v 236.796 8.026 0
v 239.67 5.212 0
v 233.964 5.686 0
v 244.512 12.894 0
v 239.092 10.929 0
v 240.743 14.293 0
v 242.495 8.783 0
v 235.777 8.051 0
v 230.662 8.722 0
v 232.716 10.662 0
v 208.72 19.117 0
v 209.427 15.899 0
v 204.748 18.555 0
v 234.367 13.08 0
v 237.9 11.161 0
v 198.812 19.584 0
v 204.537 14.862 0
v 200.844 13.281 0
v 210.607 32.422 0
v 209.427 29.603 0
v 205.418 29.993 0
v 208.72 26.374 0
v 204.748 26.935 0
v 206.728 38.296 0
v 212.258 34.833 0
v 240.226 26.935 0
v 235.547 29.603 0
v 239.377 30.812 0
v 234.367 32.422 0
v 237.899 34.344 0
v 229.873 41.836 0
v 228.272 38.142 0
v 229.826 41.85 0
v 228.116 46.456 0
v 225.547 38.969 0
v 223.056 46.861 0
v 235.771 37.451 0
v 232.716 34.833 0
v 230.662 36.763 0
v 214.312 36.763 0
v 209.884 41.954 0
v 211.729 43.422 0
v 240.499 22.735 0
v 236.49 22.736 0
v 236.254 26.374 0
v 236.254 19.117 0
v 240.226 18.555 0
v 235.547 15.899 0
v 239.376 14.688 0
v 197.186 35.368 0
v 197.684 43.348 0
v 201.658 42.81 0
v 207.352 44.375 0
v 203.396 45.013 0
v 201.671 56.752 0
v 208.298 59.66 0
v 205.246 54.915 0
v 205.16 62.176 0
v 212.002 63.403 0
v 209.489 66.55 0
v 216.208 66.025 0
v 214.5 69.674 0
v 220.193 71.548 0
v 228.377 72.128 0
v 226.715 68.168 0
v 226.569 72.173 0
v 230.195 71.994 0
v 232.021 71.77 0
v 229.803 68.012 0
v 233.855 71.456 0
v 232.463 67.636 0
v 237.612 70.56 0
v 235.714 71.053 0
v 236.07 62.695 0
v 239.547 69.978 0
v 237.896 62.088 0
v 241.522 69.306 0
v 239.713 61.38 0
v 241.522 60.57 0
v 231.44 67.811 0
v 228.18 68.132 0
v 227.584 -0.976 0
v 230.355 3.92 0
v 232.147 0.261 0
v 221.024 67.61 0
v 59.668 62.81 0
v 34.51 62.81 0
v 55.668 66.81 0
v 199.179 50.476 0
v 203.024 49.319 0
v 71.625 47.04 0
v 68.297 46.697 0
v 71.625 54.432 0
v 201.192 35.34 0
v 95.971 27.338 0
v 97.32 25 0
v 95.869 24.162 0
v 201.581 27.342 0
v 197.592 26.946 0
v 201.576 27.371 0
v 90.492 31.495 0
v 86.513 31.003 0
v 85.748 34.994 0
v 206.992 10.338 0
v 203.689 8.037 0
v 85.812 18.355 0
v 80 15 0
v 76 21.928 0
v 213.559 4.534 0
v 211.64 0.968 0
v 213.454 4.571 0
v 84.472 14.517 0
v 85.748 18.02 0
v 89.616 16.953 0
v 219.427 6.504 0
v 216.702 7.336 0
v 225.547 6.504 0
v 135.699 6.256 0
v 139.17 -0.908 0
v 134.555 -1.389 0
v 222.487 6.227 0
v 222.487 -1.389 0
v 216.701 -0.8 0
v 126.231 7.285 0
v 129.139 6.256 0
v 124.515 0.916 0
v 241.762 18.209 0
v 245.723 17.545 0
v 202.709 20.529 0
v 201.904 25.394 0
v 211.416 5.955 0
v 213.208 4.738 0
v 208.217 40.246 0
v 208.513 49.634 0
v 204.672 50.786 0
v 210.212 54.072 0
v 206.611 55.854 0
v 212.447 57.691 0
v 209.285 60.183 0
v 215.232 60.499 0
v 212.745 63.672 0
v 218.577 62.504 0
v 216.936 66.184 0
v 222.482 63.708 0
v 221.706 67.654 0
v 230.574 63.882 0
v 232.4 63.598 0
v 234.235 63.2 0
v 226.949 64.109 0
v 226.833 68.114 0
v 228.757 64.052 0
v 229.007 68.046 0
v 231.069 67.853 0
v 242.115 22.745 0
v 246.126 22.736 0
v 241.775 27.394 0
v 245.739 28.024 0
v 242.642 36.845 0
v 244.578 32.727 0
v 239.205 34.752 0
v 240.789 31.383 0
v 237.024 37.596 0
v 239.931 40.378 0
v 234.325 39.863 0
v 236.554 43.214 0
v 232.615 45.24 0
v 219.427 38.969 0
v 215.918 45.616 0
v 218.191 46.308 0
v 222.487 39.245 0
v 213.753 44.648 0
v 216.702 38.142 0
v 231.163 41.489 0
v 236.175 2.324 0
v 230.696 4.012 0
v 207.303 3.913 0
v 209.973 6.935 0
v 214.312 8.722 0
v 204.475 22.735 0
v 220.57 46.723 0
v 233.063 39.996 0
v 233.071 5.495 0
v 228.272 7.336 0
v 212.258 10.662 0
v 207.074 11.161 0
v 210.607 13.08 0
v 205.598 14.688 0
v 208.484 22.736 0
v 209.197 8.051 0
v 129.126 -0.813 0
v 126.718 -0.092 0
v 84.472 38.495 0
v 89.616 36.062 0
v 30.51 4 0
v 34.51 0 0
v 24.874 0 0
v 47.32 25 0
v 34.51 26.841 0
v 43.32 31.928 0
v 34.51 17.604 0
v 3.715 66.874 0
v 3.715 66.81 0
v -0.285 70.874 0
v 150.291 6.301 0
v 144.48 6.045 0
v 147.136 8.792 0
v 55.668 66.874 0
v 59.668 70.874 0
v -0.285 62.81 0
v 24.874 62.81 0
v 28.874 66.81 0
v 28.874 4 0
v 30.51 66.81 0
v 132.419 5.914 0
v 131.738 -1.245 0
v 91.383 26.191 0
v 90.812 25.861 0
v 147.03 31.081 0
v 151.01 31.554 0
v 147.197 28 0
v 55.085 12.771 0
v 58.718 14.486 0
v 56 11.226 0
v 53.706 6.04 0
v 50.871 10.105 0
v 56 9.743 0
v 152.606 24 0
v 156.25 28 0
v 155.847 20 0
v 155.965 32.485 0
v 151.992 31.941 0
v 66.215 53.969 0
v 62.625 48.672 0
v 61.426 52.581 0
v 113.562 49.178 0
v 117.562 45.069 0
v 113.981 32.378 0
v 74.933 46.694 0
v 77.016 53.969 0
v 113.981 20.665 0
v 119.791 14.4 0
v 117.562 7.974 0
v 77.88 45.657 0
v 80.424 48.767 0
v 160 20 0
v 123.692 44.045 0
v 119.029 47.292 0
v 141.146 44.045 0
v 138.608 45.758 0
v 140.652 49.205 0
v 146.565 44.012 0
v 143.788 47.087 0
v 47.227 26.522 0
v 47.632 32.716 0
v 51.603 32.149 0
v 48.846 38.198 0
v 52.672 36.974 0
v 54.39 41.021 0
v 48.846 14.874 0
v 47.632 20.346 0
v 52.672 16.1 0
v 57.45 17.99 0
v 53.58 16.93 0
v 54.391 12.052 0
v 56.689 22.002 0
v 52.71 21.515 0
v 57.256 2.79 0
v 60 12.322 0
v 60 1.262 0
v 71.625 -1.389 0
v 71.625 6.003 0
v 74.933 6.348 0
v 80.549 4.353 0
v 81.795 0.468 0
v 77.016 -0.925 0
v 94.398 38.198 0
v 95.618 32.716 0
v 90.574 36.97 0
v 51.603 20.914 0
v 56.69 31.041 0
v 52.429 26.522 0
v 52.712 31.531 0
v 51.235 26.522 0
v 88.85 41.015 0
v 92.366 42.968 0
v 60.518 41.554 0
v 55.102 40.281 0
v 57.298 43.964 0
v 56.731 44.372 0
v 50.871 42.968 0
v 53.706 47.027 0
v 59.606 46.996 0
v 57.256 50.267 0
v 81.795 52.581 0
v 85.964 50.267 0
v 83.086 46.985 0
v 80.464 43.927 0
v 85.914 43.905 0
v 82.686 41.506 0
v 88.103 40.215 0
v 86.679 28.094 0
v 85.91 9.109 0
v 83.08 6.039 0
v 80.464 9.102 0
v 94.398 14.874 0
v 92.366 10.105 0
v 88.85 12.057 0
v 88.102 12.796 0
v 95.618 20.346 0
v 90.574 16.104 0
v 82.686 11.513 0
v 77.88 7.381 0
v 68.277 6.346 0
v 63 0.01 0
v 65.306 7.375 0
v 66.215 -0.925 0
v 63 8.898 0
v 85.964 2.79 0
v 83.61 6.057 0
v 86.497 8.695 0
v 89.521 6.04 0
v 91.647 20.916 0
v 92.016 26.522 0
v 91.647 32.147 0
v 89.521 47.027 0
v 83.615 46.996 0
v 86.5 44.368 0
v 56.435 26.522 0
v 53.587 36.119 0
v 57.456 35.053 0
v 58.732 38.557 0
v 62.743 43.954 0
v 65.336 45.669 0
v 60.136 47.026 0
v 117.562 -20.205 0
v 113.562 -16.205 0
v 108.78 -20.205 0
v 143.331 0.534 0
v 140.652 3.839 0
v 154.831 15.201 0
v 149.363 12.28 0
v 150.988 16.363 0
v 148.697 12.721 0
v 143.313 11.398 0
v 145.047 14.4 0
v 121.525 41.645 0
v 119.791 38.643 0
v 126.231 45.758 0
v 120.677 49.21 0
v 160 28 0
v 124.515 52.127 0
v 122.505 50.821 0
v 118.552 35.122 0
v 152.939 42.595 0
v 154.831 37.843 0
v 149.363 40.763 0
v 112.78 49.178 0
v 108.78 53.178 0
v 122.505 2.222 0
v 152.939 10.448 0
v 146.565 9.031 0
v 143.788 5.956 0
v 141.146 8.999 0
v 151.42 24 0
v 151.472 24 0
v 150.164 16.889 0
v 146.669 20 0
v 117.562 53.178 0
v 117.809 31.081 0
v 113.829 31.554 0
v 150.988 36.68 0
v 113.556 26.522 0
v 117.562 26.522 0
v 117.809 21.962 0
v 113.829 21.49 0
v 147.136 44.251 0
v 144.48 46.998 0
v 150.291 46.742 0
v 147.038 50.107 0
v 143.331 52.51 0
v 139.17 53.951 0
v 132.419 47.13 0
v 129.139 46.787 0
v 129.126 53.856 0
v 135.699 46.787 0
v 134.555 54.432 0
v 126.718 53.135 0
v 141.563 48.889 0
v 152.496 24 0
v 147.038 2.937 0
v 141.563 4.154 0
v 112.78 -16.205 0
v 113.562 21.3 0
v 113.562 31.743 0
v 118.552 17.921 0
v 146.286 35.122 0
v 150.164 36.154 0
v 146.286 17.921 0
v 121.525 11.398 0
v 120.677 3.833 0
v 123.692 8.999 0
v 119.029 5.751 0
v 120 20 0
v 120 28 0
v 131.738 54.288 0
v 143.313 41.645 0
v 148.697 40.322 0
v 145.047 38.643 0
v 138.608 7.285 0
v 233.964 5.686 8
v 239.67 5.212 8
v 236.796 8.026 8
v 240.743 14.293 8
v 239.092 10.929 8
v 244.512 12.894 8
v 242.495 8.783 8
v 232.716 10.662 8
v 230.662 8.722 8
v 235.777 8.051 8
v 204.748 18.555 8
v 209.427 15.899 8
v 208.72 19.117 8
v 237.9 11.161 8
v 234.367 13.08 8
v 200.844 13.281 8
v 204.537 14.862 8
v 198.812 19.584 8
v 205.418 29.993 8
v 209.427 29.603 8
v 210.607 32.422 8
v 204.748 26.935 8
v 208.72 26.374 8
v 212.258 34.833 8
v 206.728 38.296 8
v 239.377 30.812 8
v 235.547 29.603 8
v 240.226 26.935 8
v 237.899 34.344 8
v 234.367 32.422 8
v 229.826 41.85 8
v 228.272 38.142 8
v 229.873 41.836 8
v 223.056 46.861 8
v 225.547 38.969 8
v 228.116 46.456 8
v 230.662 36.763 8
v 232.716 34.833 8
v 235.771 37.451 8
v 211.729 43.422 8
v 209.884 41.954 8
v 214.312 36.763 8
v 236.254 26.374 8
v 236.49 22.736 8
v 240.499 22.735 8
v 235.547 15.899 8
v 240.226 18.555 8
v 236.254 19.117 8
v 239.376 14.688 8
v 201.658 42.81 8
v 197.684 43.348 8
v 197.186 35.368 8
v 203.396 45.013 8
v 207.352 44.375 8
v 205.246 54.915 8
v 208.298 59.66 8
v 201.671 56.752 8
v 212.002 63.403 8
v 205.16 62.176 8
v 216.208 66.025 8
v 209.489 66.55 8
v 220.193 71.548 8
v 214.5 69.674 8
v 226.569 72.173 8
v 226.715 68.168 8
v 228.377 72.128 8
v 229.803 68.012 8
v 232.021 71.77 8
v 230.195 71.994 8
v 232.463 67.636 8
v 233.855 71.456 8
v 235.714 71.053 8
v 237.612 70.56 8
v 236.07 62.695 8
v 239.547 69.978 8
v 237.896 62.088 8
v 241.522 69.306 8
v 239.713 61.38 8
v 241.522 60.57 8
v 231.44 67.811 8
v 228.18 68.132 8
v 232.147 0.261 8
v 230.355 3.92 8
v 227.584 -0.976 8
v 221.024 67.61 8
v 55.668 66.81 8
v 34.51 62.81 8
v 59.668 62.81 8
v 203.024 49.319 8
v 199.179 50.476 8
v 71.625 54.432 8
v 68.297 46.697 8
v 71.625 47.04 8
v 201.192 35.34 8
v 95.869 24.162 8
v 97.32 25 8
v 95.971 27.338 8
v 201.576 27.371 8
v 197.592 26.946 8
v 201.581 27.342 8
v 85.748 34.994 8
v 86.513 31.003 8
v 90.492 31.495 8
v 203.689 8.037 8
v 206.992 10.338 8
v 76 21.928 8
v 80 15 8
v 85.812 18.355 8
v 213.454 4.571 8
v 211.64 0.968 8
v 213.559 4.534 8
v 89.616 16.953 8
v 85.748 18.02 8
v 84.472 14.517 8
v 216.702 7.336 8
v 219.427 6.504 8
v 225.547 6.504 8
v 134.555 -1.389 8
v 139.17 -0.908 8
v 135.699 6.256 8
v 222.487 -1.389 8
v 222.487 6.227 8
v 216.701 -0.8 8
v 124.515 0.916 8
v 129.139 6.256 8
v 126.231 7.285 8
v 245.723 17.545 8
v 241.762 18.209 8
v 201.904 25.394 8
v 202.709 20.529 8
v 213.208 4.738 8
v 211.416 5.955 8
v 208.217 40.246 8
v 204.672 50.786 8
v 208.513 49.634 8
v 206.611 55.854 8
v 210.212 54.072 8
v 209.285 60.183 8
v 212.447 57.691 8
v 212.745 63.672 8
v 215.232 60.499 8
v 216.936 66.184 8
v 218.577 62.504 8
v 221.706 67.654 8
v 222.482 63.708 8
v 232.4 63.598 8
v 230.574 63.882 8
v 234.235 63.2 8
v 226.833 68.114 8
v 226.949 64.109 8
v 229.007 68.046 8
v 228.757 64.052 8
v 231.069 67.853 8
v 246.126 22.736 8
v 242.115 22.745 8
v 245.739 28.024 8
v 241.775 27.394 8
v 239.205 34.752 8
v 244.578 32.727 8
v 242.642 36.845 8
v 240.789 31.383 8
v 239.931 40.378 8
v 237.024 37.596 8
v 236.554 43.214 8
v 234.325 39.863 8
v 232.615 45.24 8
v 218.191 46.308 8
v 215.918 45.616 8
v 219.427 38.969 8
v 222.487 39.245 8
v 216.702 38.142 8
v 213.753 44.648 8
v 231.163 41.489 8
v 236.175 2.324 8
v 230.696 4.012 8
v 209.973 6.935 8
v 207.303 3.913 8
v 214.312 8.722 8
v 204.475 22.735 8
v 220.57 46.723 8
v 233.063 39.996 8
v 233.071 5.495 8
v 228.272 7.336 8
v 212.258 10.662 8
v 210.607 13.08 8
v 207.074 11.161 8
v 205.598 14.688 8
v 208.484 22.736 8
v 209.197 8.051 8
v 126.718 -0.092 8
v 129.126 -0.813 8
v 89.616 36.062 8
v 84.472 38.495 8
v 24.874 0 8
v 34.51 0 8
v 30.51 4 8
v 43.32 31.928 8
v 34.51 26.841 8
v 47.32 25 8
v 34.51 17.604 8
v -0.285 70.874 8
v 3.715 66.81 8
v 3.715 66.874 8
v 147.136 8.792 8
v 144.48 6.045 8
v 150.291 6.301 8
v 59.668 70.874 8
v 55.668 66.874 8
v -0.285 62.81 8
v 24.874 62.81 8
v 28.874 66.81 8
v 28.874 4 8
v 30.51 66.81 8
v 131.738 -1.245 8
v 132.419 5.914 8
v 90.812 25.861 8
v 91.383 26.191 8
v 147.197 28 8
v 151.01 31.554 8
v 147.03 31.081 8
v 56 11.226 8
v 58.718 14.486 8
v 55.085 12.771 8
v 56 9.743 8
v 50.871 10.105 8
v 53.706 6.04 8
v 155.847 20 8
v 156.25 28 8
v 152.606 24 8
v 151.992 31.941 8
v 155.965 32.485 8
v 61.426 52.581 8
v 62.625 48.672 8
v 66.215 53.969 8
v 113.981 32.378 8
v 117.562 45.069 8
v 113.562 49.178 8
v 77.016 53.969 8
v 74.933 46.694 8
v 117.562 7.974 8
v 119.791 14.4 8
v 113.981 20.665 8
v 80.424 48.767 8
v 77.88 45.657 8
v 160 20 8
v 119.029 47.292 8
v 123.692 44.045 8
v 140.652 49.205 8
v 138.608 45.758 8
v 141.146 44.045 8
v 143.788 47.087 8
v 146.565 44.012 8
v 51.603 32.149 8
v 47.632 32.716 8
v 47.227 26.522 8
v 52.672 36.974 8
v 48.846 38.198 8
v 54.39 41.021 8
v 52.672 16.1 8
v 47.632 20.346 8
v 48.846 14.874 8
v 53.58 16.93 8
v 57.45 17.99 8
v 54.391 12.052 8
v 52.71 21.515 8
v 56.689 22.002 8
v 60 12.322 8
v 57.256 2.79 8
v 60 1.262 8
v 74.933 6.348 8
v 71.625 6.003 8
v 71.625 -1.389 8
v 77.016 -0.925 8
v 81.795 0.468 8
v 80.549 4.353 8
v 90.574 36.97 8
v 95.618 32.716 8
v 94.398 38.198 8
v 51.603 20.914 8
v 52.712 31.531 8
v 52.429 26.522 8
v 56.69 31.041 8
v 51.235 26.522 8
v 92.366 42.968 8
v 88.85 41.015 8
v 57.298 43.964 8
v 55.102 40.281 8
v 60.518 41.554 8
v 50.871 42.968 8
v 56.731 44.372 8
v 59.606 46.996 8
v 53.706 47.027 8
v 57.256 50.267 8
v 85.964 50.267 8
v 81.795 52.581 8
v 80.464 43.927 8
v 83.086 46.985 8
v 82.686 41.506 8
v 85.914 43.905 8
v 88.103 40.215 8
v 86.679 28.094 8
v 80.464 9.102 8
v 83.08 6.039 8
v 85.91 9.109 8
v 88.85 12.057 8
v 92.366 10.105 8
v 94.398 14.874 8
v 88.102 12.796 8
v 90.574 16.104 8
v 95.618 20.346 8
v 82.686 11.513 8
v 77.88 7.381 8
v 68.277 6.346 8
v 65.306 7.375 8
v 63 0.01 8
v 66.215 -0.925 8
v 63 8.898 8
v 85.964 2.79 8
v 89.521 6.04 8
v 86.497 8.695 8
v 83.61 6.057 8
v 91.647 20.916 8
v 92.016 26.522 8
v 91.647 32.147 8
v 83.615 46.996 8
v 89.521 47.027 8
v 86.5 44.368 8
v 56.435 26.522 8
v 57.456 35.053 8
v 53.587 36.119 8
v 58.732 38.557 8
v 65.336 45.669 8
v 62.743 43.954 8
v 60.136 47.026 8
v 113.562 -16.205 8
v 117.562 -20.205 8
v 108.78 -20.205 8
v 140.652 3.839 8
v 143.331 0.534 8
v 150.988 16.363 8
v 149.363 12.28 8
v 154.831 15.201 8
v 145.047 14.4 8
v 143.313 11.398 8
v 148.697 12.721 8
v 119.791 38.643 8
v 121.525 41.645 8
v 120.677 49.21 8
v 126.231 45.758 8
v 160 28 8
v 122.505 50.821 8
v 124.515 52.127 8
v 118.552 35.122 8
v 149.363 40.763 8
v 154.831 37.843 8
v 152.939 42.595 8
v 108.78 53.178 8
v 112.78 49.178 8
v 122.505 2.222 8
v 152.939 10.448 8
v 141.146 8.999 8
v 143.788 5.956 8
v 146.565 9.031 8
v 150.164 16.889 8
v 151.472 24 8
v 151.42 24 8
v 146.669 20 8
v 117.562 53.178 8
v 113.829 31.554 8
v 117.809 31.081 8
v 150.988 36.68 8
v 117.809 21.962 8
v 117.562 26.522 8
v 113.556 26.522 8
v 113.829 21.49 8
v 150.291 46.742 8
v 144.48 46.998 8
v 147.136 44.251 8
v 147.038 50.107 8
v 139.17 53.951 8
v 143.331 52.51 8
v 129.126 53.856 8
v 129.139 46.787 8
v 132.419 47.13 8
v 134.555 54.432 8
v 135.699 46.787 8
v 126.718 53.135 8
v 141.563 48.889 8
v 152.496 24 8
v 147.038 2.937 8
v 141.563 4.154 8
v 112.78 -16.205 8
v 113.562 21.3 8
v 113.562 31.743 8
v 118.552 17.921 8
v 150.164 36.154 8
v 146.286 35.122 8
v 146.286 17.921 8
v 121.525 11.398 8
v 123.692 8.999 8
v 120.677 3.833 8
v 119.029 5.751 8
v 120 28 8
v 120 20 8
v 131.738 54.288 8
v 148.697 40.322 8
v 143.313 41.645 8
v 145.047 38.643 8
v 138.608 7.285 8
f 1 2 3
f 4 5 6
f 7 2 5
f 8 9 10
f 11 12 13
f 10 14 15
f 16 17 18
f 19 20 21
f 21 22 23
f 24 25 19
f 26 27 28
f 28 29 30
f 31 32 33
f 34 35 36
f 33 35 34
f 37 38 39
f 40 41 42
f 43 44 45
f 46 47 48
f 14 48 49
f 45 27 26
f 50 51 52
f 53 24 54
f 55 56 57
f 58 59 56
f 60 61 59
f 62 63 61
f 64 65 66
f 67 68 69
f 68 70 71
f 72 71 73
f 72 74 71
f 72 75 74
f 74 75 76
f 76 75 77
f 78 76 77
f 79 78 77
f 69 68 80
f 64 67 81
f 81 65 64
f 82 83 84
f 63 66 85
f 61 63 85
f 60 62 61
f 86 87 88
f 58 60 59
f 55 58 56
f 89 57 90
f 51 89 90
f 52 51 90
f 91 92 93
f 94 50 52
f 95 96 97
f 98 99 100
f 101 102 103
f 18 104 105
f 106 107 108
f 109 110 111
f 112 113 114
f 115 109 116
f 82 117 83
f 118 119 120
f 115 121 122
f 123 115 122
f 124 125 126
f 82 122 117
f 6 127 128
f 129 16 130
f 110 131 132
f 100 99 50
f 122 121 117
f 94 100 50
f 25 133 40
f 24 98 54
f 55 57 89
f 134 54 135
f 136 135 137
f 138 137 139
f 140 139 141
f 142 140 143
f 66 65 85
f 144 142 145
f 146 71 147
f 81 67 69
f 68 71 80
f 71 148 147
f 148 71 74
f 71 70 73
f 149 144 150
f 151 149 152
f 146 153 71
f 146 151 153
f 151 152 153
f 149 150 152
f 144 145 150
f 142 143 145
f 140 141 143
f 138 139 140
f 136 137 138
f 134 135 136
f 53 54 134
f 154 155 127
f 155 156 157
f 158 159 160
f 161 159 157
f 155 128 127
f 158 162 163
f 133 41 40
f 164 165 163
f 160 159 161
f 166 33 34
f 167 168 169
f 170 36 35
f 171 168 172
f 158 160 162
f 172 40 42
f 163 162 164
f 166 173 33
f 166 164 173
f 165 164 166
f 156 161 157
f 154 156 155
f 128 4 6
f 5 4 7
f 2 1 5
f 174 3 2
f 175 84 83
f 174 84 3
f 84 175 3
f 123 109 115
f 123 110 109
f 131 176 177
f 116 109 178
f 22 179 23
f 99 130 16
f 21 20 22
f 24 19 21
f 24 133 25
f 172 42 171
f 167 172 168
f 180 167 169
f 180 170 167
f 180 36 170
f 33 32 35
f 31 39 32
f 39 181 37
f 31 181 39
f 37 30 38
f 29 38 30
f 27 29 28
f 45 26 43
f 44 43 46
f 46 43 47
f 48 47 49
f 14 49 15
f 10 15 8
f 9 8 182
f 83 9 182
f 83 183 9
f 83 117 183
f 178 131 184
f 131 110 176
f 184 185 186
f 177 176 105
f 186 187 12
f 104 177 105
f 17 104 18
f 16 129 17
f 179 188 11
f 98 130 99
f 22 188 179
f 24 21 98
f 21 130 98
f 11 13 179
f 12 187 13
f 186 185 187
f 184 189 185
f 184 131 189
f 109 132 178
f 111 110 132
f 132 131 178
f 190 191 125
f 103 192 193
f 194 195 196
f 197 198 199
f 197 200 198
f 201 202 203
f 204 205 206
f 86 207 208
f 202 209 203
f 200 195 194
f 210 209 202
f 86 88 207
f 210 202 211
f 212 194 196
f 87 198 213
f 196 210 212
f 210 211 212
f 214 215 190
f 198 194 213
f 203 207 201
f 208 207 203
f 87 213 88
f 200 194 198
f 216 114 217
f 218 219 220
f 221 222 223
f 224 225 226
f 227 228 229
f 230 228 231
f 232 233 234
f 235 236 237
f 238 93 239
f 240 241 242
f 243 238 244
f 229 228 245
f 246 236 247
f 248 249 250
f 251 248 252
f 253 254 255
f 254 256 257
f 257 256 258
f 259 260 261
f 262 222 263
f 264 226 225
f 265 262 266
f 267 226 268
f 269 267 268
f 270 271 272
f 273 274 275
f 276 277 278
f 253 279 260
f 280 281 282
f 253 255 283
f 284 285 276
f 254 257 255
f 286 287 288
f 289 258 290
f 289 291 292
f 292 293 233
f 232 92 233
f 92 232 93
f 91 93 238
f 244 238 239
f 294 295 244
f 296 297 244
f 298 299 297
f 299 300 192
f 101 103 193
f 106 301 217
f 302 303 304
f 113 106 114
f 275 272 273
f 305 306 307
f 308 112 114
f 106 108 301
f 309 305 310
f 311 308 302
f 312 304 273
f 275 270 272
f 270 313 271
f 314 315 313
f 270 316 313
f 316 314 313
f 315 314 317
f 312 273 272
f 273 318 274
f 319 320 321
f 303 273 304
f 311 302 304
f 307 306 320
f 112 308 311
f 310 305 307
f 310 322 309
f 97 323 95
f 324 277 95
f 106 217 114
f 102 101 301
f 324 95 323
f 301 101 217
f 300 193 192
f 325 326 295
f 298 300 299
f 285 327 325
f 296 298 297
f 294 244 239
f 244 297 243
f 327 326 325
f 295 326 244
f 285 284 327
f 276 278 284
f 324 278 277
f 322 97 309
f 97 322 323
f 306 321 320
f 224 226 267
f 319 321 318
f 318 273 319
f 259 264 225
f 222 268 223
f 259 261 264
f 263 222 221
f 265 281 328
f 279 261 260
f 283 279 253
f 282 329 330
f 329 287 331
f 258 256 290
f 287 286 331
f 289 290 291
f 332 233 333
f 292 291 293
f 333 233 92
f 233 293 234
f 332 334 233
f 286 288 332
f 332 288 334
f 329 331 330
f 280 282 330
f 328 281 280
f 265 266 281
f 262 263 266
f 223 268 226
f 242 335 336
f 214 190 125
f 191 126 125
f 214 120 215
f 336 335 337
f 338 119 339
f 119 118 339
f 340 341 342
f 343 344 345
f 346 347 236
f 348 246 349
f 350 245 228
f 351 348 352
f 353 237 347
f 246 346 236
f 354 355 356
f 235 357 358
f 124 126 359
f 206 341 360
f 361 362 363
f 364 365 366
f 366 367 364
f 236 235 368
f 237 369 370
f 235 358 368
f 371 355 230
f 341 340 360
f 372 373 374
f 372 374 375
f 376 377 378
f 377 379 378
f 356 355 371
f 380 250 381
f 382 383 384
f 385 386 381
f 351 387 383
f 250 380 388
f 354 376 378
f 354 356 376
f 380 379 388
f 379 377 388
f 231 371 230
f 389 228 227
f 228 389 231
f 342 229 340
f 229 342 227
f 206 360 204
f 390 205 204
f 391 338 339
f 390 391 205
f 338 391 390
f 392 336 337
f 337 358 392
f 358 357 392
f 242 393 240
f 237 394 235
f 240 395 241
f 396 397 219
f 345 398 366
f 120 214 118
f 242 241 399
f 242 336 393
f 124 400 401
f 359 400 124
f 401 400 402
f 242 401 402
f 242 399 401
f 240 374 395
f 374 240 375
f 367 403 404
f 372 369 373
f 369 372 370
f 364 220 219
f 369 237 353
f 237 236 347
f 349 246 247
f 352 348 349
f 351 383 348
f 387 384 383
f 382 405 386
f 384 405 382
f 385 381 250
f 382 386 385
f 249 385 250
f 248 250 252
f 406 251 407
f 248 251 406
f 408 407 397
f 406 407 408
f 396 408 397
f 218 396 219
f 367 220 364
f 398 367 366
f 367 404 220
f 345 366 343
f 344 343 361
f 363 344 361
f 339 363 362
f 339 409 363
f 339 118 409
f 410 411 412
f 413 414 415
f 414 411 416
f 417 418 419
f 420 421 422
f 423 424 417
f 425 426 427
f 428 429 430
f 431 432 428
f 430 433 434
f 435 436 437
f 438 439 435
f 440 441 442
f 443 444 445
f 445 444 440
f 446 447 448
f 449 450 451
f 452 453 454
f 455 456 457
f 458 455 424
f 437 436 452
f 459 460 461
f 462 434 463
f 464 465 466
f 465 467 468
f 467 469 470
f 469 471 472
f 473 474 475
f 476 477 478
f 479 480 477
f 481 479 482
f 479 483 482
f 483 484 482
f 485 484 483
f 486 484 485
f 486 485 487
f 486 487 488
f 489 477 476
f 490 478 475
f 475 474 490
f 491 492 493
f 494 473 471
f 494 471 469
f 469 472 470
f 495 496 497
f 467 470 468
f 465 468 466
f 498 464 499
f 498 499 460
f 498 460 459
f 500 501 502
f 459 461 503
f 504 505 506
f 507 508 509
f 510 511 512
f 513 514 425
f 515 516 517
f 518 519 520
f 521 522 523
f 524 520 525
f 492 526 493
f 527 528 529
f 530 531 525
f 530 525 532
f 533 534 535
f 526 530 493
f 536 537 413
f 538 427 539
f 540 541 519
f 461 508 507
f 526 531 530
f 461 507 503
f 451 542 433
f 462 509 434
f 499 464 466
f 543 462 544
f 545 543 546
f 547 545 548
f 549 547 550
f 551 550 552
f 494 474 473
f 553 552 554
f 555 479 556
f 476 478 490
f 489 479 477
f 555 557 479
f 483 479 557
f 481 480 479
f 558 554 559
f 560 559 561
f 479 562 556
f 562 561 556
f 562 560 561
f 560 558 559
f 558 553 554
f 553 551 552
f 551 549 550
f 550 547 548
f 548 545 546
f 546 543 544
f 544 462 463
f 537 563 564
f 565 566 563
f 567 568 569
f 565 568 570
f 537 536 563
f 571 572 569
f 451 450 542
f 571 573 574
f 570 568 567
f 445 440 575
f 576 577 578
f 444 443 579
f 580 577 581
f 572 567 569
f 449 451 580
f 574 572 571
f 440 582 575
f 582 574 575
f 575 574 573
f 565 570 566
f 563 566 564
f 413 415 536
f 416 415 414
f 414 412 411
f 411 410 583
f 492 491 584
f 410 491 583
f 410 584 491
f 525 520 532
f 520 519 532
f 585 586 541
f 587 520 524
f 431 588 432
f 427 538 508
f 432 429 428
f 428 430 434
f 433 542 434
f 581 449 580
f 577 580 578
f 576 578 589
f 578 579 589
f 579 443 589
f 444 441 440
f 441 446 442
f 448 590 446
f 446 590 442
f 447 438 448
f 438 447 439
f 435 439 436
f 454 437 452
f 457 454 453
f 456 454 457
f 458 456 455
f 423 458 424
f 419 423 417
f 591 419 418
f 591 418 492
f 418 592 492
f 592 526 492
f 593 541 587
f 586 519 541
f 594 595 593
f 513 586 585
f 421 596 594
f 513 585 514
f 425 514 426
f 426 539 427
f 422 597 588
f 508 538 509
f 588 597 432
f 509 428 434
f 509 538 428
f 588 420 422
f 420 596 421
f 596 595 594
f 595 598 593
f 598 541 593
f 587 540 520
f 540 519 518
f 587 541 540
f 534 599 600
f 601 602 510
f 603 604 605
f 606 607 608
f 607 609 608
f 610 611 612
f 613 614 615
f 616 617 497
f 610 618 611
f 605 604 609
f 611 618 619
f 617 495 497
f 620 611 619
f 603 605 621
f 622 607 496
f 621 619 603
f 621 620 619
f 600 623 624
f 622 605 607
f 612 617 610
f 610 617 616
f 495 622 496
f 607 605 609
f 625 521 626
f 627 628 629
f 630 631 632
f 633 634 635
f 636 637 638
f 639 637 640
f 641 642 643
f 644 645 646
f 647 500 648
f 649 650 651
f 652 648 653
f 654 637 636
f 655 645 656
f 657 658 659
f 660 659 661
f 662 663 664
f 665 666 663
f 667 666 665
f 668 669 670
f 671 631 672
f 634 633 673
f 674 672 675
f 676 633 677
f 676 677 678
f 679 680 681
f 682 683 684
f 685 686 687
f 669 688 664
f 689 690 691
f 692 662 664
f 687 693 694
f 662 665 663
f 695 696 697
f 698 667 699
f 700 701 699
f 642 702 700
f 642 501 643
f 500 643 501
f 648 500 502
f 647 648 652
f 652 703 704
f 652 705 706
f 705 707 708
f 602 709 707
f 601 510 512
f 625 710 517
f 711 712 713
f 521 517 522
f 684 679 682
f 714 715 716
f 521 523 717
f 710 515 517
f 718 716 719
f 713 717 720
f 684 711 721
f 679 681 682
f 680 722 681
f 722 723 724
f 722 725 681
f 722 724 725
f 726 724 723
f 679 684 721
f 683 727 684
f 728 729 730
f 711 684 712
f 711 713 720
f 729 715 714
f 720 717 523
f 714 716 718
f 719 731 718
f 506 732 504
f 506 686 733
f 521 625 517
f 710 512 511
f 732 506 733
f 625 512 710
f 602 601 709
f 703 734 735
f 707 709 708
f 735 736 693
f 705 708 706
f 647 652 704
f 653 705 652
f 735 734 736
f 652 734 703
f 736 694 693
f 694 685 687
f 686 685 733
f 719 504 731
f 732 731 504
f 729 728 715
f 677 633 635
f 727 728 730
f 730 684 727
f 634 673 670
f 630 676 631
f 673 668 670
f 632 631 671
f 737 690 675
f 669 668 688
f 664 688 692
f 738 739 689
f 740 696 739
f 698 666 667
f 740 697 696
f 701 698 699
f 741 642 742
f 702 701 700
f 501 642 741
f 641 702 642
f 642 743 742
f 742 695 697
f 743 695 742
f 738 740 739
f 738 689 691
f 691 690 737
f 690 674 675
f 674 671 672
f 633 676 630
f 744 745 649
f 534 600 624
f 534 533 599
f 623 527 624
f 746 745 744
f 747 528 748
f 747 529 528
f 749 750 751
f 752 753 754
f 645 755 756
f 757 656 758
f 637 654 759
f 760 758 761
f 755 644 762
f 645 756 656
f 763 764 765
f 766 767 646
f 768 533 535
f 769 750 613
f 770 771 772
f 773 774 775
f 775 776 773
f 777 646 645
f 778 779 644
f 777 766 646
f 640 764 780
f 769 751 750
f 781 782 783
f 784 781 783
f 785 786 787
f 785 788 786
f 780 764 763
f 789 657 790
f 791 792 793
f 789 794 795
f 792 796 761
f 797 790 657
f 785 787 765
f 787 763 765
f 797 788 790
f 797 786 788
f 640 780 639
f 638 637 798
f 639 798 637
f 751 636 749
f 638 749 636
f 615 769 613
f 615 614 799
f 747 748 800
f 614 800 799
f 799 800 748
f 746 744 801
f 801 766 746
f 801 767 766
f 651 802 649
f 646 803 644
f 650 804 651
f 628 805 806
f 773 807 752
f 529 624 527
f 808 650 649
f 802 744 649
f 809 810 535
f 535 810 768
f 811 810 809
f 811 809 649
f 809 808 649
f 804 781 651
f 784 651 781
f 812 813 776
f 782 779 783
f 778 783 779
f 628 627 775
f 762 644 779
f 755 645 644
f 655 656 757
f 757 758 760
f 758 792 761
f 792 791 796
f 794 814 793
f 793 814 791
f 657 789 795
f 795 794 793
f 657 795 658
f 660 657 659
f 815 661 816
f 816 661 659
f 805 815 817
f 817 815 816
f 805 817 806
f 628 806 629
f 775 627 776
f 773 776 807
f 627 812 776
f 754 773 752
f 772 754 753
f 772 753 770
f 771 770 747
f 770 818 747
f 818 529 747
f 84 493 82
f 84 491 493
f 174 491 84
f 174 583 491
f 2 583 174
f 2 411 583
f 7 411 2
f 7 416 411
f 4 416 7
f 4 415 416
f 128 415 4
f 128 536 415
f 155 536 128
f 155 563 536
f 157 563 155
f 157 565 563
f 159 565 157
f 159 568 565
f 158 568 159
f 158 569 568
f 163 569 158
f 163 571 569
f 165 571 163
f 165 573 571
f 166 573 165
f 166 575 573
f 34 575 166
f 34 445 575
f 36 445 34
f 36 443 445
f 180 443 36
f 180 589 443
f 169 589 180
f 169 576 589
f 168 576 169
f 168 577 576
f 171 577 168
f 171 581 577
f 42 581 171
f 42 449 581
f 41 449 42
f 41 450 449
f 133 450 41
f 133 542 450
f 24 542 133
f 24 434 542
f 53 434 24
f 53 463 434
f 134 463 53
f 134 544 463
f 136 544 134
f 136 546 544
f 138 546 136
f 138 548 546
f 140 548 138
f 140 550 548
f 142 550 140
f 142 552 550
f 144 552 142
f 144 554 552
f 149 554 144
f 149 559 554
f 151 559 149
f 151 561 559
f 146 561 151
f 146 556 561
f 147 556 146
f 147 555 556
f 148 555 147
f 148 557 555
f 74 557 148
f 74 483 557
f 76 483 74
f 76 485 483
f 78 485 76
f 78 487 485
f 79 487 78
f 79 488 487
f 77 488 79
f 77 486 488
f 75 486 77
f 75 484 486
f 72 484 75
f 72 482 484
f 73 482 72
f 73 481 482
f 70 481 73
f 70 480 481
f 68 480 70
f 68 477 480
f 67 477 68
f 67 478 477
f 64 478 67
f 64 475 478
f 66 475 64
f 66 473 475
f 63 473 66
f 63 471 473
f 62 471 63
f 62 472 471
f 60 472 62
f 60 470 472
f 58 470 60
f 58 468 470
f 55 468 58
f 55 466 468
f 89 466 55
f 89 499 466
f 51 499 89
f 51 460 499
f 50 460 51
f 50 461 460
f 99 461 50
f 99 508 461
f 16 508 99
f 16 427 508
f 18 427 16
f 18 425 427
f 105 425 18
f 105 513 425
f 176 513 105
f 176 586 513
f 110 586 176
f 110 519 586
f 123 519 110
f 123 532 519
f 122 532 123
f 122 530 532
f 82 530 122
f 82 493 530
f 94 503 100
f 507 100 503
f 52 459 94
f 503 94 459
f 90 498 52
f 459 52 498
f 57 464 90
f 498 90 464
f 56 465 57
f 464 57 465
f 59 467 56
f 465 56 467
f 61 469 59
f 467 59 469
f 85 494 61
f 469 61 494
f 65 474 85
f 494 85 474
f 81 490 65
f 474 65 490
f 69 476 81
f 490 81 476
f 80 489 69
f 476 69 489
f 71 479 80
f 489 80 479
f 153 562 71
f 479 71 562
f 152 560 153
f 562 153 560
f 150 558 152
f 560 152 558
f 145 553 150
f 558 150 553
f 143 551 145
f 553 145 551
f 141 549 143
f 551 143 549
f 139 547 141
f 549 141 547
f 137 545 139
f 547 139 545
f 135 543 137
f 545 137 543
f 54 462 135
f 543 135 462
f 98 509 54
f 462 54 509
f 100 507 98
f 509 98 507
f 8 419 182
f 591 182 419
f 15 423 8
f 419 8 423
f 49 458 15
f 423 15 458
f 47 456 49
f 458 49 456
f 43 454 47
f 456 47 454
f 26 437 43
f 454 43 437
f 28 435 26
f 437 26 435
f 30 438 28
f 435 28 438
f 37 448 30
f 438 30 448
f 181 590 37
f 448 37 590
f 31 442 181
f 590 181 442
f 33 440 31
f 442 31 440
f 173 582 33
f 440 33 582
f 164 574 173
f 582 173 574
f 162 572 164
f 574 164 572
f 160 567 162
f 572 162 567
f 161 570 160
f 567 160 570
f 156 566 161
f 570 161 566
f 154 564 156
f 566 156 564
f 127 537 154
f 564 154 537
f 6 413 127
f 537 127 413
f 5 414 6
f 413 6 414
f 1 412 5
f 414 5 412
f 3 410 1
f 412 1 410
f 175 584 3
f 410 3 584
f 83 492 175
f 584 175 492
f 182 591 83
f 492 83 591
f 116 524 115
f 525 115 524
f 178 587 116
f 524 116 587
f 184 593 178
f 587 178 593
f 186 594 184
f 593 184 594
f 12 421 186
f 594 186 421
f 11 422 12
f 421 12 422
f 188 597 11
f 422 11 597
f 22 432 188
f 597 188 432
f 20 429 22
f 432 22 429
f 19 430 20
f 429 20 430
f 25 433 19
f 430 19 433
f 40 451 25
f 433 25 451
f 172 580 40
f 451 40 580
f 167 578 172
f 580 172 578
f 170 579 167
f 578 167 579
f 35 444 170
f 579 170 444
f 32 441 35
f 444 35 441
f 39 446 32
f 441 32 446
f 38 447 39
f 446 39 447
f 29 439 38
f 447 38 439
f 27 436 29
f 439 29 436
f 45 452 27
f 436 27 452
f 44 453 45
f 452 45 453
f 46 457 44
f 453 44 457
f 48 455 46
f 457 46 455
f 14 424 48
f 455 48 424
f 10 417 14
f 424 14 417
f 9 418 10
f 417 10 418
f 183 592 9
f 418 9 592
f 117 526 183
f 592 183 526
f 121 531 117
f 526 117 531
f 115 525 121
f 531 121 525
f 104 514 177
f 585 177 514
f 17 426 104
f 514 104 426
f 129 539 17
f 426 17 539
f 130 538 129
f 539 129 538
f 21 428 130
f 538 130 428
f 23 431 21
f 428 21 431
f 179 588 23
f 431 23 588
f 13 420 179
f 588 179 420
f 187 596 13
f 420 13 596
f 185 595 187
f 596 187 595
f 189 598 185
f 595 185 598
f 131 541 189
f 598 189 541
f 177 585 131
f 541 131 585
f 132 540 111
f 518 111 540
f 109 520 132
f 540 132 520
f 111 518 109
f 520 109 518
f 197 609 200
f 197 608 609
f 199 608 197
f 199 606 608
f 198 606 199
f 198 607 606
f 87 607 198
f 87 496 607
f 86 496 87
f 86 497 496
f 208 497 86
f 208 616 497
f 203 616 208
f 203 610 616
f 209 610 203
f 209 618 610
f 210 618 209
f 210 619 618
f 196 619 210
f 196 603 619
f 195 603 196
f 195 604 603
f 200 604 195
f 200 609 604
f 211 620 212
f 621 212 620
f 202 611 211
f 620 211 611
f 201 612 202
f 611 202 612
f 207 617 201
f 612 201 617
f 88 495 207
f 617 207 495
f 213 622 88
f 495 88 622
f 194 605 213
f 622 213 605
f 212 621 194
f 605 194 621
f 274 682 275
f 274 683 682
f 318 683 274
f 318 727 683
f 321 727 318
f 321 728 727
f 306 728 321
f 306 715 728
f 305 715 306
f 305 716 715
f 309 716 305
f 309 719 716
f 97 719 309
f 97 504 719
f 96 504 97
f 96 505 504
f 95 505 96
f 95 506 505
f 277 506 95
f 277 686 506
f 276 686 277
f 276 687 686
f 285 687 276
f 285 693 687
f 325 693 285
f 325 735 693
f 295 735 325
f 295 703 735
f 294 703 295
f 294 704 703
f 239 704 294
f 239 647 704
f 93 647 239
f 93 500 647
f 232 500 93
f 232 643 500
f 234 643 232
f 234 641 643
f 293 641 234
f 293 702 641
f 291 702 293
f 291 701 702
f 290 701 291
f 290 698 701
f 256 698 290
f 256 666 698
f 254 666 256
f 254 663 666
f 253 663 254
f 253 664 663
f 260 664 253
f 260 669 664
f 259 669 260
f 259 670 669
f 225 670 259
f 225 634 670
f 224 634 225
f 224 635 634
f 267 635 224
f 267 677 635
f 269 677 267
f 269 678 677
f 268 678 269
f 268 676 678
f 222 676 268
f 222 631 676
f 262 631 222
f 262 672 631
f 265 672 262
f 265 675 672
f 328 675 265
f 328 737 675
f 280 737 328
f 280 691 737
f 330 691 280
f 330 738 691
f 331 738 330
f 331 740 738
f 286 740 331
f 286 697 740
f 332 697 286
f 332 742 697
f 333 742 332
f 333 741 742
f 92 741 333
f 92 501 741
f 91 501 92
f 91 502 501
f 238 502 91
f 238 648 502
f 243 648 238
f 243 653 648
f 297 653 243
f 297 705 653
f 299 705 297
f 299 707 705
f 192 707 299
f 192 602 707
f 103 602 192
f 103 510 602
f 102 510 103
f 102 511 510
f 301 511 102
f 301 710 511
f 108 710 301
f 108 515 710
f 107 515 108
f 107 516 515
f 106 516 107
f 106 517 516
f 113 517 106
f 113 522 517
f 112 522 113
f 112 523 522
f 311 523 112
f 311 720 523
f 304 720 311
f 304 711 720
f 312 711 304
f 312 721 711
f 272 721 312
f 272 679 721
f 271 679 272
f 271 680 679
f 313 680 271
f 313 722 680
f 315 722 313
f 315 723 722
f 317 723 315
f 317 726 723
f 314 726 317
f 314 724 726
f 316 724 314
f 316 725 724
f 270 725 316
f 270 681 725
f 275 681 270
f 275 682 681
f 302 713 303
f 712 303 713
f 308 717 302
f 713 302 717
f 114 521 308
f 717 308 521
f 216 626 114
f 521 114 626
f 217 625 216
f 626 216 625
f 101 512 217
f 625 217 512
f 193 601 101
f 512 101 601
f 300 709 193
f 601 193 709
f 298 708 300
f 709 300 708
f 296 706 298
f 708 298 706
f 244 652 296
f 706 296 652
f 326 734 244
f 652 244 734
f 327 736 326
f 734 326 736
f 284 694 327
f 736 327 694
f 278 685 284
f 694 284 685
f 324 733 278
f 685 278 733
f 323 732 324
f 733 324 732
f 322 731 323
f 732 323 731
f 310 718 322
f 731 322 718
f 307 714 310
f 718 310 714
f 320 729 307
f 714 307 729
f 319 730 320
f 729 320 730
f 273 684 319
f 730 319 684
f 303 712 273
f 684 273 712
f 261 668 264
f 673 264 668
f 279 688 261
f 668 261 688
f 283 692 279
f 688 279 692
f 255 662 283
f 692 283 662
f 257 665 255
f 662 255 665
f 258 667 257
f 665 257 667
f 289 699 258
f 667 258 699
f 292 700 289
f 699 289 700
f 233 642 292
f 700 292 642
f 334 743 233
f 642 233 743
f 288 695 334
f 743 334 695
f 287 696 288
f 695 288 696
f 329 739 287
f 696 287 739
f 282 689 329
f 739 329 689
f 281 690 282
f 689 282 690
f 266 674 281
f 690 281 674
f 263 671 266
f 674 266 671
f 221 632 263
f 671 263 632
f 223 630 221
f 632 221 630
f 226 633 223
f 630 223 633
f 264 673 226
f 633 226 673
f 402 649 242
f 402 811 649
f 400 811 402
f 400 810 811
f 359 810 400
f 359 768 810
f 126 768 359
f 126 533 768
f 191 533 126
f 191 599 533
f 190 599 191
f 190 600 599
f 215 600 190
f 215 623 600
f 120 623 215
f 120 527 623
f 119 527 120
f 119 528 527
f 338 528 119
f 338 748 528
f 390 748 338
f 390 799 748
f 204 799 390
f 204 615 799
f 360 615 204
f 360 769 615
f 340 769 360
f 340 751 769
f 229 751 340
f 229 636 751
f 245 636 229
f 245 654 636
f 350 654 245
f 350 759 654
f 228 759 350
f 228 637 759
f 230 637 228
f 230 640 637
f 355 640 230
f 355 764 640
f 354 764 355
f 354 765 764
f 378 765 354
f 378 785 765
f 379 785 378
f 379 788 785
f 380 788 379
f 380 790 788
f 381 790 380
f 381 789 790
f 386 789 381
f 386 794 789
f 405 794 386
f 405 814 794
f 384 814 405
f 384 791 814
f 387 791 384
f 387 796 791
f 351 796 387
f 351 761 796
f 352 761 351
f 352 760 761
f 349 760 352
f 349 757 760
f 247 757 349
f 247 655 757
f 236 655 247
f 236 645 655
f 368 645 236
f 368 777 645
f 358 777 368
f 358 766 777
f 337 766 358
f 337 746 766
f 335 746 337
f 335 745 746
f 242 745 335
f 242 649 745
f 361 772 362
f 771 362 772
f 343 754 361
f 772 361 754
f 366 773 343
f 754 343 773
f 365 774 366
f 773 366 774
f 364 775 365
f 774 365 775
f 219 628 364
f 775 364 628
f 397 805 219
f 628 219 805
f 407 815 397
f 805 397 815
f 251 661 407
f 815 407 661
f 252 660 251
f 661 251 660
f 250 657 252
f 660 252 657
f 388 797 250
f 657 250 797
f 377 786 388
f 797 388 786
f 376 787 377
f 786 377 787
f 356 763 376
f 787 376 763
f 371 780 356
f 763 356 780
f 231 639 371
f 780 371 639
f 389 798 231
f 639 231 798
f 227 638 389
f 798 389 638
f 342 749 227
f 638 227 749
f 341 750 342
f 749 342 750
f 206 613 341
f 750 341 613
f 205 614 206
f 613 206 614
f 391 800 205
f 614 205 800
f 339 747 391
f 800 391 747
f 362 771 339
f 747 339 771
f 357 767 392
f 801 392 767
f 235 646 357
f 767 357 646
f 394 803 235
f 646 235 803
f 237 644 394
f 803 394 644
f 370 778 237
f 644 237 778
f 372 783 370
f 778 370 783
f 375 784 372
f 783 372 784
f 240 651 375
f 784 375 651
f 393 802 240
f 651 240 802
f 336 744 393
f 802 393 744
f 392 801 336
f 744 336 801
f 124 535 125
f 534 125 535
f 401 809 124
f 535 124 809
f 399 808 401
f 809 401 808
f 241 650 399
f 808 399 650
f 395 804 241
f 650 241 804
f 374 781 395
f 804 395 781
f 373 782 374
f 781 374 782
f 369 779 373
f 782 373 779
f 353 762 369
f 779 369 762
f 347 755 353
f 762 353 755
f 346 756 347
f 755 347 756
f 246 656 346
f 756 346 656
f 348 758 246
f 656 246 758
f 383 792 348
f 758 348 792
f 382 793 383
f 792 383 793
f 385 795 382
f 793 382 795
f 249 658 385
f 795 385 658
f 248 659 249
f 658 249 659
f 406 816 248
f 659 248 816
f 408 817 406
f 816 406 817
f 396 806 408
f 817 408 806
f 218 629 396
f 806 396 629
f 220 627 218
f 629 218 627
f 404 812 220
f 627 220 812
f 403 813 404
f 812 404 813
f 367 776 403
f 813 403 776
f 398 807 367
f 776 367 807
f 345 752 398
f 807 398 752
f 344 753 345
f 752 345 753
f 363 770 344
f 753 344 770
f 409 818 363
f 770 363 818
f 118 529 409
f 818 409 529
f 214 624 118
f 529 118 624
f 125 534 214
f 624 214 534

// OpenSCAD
H = 8;
OUTLINE_W = 4;
hollow = true;

module flat(hollow_support) {
	translate([30,15])
	rotate(30)
		square([20,8]);

	translate([80,15])
	rotate(30)
		square([20,8]);
	
	translate([120,20])
		square([40,8]);

	difference() {
		text("Top 6", font="Chau Philomene One", size=70);
		if (hollow_support) {
			translate([60,-6]) square([3,20]);
			translate([104,-6]) square([3,20]);
			translate([173,-6]) square([3,20]);
		}
	}
}

module top6_hollow(H,OUTLINE_W) {
	linear_extrude(height=H) {
		difference() {
			flat(true);
			offset(delta=-OUTLINE_W) flat(true);
		}
	}
}

module top6(H) {
	linear_extrude(height=H) flat(false);
}

if (hollow)
	top6_hollow(H,OUTLINE_W);
else
	top6(H);
